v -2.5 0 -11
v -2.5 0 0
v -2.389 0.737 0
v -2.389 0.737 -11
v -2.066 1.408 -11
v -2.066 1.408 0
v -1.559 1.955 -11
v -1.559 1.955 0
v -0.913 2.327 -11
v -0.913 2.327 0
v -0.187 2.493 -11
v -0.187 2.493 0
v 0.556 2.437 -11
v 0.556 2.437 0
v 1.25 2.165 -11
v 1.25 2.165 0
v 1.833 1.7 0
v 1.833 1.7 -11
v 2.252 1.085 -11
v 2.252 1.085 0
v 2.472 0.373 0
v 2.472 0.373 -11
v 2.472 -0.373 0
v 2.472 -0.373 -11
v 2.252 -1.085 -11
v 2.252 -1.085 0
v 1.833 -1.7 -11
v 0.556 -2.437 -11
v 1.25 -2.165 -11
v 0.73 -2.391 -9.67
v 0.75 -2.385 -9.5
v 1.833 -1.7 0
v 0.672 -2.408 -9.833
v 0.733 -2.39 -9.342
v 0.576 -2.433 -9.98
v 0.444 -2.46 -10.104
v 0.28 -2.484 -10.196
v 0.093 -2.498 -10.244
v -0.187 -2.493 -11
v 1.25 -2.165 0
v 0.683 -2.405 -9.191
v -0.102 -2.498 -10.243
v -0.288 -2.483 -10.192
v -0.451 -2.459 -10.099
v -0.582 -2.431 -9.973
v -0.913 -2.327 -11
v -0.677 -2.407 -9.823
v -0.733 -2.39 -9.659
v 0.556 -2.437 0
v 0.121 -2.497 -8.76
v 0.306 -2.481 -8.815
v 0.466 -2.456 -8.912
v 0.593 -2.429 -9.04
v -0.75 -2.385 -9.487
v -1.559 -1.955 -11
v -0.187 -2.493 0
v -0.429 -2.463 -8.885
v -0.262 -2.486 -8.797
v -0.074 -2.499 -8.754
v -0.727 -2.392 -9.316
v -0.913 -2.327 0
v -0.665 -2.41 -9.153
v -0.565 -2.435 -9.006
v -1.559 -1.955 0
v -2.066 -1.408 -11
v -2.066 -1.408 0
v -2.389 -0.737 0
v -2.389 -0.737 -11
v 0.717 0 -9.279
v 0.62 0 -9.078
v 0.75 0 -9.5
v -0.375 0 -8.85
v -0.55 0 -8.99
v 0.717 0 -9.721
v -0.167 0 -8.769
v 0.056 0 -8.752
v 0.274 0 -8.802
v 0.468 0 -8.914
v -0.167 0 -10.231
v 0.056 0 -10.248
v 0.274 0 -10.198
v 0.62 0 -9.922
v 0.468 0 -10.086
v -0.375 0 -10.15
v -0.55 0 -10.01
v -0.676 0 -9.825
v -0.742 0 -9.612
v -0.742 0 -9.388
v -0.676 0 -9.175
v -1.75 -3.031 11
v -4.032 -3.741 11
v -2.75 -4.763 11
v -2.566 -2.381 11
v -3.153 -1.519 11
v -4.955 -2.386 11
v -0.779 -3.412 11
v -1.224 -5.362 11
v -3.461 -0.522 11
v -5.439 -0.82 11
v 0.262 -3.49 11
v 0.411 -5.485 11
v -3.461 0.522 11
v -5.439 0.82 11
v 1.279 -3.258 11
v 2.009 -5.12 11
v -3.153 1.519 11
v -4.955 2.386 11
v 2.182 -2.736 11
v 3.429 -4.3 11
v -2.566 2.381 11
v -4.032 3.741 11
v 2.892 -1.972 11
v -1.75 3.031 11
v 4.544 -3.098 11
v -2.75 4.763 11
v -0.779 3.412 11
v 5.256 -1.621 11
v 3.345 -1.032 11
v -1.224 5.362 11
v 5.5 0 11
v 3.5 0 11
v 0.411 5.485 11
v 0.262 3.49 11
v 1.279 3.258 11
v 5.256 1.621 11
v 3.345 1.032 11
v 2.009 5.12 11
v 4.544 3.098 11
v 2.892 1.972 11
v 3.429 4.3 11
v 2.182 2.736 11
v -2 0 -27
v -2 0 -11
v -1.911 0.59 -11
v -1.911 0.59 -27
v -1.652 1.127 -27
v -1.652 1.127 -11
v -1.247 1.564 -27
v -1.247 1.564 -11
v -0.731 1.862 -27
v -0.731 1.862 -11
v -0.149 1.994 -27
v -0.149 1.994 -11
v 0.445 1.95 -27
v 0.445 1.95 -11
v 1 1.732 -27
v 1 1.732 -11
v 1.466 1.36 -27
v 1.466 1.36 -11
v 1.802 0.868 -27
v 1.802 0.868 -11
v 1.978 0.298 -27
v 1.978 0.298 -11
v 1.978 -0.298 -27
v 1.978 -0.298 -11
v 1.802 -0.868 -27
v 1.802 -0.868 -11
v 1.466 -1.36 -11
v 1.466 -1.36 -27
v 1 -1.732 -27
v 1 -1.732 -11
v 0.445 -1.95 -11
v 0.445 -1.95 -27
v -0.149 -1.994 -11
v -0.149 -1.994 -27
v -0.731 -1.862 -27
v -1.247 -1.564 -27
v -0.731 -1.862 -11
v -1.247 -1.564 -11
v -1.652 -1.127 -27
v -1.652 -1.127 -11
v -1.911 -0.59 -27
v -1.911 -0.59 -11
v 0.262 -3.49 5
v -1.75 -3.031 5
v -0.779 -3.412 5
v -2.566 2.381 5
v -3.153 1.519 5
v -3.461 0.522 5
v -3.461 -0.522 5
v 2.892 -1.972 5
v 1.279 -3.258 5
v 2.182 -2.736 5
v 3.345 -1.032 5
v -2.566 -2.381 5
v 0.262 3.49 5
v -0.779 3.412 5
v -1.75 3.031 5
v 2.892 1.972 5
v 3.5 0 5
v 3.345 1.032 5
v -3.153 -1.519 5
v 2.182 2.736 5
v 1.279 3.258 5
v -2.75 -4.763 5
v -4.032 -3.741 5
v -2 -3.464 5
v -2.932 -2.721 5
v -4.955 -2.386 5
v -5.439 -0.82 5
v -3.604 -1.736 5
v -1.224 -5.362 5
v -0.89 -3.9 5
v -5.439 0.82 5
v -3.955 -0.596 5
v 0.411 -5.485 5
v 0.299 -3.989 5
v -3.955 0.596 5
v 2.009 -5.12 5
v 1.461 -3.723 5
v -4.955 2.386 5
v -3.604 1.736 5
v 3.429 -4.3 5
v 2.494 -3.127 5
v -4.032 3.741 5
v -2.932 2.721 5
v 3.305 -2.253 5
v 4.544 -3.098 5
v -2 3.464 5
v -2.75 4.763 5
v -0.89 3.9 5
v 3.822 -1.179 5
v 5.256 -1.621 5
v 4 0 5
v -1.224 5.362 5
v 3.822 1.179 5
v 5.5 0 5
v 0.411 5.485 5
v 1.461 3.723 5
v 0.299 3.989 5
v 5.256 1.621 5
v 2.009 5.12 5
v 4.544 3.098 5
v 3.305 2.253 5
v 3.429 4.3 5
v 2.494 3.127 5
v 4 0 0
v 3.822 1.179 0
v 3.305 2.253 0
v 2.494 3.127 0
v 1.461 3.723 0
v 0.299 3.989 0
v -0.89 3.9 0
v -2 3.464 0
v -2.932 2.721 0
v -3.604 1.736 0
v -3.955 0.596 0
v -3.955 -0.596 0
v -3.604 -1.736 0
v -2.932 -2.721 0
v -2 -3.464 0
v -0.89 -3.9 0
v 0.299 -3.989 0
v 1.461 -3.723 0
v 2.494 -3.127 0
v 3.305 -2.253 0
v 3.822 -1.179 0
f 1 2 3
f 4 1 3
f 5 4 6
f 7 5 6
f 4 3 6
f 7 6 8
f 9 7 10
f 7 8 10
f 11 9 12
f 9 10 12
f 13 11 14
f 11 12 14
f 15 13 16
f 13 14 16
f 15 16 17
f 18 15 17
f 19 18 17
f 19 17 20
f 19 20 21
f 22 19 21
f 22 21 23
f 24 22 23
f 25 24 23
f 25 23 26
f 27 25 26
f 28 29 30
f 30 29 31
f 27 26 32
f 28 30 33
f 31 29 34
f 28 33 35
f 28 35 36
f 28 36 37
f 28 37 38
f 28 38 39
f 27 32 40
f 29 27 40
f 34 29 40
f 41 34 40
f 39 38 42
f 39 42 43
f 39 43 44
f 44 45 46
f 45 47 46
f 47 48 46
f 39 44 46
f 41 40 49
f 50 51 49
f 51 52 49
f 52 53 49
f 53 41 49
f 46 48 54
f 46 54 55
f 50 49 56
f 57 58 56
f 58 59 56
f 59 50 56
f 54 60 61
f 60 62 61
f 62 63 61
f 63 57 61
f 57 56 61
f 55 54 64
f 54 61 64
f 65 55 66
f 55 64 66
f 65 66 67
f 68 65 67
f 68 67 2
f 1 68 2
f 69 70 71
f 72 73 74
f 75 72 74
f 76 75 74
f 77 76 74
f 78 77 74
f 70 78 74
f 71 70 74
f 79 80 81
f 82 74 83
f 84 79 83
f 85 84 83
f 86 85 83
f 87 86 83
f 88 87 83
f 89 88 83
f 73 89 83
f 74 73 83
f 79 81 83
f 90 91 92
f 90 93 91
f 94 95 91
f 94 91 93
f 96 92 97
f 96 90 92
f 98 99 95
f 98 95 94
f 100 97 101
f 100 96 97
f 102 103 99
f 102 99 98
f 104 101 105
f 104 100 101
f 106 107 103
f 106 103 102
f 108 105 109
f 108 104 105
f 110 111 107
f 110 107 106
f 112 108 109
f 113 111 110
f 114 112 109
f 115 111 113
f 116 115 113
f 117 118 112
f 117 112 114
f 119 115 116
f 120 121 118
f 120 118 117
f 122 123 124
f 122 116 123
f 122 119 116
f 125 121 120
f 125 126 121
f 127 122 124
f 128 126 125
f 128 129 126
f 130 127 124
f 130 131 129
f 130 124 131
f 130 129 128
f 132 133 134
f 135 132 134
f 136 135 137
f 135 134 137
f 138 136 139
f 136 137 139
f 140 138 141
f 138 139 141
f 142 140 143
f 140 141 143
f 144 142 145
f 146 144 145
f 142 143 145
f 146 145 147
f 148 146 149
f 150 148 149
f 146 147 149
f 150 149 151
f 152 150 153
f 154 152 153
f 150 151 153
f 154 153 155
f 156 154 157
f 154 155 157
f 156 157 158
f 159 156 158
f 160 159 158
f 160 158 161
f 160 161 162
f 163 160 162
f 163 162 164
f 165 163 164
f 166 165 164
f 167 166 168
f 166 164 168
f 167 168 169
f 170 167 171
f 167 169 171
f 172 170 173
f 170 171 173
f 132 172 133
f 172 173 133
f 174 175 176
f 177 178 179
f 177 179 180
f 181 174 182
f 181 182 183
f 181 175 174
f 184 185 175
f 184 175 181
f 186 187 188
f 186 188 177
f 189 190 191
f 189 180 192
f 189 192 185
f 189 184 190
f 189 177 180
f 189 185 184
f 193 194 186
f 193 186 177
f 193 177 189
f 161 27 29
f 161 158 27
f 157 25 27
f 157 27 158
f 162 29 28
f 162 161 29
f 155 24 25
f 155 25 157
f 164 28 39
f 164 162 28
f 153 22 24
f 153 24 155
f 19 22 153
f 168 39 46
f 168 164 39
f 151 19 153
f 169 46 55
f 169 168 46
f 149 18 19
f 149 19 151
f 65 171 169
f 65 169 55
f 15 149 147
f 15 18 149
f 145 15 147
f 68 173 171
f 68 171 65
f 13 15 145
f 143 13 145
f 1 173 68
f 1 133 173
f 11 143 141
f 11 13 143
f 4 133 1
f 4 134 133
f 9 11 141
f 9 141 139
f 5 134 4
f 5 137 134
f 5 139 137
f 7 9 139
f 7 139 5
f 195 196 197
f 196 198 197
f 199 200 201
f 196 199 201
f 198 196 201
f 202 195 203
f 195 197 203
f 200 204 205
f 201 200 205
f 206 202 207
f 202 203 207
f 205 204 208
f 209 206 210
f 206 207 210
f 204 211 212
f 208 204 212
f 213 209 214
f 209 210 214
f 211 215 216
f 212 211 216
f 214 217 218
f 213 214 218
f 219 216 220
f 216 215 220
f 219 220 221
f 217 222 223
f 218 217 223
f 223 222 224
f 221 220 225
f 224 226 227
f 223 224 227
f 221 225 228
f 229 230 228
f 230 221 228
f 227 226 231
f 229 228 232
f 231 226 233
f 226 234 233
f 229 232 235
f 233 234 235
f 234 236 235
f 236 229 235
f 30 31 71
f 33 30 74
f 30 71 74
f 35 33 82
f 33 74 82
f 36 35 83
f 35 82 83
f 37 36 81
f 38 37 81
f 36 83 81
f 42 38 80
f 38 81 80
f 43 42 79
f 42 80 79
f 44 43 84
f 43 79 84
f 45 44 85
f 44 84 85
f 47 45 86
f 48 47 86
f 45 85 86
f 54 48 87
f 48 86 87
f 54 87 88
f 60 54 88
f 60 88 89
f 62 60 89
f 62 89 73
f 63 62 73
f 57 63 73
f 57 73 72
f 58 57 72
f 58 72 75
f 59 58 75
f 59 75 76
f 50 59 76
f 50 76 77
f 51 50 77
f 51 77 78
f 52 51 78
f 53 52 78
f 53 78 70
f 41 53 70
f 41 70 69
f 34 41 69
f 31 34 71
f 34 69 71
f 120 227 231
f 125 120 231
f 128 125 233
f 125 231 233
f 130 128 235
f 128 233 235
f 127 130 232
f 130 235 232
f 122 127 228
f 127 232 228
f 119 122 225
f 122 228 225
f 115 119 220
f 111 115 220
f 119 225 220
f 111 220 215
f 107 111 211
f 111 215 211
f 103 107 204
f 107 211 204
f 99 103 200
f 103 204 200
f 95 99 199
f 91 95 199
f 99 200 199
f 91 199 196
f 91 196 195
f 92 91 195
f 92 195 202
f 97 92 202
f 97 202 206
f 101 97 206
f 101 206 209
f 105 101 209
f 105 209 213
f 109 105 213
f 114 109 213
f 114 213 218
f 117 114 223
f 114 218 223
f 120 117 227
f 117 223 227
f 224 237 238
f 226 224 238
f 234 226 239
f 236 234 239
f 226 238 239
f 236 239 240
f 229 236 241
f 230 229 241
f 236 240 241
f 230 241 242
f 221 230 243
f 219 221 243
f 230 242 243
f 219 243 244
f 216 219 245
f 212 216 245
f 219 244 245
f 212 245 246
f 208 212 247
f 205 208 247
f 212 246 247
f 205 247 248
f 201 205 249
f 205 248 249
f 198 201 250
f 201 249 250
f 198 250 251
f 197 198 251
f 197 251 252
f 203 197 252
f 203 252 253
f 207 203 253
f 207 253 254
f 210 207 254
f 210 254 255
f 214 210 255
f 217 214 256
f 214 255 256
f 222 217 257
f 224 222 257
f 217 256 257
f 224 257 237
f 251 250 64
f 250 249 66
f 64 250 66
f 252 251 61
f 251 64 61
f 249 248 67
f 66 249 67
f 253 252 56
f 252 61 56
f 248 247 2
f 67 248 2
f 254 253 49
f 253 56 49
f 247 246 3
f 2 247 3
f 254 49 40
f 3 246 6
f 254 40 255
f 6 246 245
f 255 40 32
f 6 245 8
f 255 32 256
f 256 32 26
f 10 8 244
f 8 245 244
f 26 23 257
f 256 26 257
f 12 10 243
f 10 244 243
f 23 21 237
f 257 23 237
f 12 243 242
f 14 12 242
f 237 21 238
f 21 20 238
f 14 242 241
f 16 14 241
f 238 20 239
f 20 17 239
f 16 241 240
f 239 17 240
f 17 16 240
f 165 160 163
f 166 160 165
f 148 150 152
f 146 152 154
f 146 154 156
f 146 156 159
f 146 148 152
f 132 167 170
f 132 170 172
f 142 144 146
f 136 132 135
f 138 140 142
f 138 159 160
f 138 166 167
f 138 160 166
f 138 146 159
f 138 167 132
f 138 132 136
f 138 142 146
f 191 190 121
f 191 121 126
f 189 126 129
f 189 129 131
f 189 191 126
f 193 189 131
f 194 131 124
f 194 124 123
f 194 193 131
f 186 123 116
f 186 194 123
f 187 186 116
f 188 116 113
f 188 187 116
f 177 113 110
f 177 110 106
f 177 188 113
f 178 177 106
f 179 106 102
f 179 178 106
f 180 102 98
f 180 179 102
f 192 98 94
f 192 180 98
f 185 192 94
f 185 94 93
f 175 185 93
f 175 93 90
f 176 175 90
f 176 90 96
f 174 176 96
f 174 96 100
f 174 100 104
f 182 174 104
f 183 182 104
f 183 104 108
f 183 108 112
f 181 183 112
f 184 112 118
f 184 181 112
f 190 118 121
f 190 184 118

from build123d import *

# Parameters (mm, degrees)
CROQUIS1_R              = 4
SALIENTE_EXTRUIR1_DEPTH = 5
CROQUIS2_R              = 5.5
CROQUIS2_R_2            = 3.5
SALIENTE_EXTRUIR2_DEPTH = 6
CROQUIS3_R              = 2.5
SALIENTE_EXTRUIR3_DEPTH = 11
CROQUIS4_R              = 2
SALIENTE_EXTRUIR4_DEPTH = 16
CROQUIS5_R              = 0.75
CORTAR_EXTRUIR1_DEPTH   = 6.5


with BuildPart() as part:
    # Croquis1 → Saliente-Extruir1 (new body)
    with BuildSketch(Plane.XY):
        Circle(CROQUIS1_R)
    extrude(amount=SALIENTE_EXTRUIR1_DEPTH)

    # Croquis2 → Saliente-Extruir2 (add)
    with BuildSketch(Plane.XY.offset(5)):
        Circle(CROQUIS2_R)
        Circle(CROQUIS2_R_2, mode=Mode.SUBTRACT)
    extrude(amount=SALIENTE_EXTRUIR2_DEPTH)

    # Croquis3 → Saliente-Extruir3 (add)
    with BuildSketch(Plane(origin=(0, 0, 0), x_dir=(-1, 0, 0), z_dir=(0, 0, -1))):
        Circle(CROQUIS3_R)
    extrude(amount=SALIENTE_EXTRUIR3_DEPTH)

    # Croquis4 → Saliente-Extruir4 (add)
    with BuildSketch(Plane(origin=(0, 0, -11), x_dir=(-1, 0, 0), z_dir=(0, 0, -1))):
        Circle(CROQUIS4_R)
    extrude(amount=SALIENTE_EXTRUIR4_DEPTH)

    # Croquis5 → Cortar-Extruir1 (cut, through all)
    with BuildSketch(Plane(origin=(0, 0, 0), x_dir=(1, 0, 0), z_dir=(0, 1, 0))):
        with Locations((0, 9.5)):
            Circle(CROQUIS5_R)
    extrude(amount=-CORTAR_EXTRUIR1_DEPTH, mode=Mode.SUBTRACT)


solid = part.part
